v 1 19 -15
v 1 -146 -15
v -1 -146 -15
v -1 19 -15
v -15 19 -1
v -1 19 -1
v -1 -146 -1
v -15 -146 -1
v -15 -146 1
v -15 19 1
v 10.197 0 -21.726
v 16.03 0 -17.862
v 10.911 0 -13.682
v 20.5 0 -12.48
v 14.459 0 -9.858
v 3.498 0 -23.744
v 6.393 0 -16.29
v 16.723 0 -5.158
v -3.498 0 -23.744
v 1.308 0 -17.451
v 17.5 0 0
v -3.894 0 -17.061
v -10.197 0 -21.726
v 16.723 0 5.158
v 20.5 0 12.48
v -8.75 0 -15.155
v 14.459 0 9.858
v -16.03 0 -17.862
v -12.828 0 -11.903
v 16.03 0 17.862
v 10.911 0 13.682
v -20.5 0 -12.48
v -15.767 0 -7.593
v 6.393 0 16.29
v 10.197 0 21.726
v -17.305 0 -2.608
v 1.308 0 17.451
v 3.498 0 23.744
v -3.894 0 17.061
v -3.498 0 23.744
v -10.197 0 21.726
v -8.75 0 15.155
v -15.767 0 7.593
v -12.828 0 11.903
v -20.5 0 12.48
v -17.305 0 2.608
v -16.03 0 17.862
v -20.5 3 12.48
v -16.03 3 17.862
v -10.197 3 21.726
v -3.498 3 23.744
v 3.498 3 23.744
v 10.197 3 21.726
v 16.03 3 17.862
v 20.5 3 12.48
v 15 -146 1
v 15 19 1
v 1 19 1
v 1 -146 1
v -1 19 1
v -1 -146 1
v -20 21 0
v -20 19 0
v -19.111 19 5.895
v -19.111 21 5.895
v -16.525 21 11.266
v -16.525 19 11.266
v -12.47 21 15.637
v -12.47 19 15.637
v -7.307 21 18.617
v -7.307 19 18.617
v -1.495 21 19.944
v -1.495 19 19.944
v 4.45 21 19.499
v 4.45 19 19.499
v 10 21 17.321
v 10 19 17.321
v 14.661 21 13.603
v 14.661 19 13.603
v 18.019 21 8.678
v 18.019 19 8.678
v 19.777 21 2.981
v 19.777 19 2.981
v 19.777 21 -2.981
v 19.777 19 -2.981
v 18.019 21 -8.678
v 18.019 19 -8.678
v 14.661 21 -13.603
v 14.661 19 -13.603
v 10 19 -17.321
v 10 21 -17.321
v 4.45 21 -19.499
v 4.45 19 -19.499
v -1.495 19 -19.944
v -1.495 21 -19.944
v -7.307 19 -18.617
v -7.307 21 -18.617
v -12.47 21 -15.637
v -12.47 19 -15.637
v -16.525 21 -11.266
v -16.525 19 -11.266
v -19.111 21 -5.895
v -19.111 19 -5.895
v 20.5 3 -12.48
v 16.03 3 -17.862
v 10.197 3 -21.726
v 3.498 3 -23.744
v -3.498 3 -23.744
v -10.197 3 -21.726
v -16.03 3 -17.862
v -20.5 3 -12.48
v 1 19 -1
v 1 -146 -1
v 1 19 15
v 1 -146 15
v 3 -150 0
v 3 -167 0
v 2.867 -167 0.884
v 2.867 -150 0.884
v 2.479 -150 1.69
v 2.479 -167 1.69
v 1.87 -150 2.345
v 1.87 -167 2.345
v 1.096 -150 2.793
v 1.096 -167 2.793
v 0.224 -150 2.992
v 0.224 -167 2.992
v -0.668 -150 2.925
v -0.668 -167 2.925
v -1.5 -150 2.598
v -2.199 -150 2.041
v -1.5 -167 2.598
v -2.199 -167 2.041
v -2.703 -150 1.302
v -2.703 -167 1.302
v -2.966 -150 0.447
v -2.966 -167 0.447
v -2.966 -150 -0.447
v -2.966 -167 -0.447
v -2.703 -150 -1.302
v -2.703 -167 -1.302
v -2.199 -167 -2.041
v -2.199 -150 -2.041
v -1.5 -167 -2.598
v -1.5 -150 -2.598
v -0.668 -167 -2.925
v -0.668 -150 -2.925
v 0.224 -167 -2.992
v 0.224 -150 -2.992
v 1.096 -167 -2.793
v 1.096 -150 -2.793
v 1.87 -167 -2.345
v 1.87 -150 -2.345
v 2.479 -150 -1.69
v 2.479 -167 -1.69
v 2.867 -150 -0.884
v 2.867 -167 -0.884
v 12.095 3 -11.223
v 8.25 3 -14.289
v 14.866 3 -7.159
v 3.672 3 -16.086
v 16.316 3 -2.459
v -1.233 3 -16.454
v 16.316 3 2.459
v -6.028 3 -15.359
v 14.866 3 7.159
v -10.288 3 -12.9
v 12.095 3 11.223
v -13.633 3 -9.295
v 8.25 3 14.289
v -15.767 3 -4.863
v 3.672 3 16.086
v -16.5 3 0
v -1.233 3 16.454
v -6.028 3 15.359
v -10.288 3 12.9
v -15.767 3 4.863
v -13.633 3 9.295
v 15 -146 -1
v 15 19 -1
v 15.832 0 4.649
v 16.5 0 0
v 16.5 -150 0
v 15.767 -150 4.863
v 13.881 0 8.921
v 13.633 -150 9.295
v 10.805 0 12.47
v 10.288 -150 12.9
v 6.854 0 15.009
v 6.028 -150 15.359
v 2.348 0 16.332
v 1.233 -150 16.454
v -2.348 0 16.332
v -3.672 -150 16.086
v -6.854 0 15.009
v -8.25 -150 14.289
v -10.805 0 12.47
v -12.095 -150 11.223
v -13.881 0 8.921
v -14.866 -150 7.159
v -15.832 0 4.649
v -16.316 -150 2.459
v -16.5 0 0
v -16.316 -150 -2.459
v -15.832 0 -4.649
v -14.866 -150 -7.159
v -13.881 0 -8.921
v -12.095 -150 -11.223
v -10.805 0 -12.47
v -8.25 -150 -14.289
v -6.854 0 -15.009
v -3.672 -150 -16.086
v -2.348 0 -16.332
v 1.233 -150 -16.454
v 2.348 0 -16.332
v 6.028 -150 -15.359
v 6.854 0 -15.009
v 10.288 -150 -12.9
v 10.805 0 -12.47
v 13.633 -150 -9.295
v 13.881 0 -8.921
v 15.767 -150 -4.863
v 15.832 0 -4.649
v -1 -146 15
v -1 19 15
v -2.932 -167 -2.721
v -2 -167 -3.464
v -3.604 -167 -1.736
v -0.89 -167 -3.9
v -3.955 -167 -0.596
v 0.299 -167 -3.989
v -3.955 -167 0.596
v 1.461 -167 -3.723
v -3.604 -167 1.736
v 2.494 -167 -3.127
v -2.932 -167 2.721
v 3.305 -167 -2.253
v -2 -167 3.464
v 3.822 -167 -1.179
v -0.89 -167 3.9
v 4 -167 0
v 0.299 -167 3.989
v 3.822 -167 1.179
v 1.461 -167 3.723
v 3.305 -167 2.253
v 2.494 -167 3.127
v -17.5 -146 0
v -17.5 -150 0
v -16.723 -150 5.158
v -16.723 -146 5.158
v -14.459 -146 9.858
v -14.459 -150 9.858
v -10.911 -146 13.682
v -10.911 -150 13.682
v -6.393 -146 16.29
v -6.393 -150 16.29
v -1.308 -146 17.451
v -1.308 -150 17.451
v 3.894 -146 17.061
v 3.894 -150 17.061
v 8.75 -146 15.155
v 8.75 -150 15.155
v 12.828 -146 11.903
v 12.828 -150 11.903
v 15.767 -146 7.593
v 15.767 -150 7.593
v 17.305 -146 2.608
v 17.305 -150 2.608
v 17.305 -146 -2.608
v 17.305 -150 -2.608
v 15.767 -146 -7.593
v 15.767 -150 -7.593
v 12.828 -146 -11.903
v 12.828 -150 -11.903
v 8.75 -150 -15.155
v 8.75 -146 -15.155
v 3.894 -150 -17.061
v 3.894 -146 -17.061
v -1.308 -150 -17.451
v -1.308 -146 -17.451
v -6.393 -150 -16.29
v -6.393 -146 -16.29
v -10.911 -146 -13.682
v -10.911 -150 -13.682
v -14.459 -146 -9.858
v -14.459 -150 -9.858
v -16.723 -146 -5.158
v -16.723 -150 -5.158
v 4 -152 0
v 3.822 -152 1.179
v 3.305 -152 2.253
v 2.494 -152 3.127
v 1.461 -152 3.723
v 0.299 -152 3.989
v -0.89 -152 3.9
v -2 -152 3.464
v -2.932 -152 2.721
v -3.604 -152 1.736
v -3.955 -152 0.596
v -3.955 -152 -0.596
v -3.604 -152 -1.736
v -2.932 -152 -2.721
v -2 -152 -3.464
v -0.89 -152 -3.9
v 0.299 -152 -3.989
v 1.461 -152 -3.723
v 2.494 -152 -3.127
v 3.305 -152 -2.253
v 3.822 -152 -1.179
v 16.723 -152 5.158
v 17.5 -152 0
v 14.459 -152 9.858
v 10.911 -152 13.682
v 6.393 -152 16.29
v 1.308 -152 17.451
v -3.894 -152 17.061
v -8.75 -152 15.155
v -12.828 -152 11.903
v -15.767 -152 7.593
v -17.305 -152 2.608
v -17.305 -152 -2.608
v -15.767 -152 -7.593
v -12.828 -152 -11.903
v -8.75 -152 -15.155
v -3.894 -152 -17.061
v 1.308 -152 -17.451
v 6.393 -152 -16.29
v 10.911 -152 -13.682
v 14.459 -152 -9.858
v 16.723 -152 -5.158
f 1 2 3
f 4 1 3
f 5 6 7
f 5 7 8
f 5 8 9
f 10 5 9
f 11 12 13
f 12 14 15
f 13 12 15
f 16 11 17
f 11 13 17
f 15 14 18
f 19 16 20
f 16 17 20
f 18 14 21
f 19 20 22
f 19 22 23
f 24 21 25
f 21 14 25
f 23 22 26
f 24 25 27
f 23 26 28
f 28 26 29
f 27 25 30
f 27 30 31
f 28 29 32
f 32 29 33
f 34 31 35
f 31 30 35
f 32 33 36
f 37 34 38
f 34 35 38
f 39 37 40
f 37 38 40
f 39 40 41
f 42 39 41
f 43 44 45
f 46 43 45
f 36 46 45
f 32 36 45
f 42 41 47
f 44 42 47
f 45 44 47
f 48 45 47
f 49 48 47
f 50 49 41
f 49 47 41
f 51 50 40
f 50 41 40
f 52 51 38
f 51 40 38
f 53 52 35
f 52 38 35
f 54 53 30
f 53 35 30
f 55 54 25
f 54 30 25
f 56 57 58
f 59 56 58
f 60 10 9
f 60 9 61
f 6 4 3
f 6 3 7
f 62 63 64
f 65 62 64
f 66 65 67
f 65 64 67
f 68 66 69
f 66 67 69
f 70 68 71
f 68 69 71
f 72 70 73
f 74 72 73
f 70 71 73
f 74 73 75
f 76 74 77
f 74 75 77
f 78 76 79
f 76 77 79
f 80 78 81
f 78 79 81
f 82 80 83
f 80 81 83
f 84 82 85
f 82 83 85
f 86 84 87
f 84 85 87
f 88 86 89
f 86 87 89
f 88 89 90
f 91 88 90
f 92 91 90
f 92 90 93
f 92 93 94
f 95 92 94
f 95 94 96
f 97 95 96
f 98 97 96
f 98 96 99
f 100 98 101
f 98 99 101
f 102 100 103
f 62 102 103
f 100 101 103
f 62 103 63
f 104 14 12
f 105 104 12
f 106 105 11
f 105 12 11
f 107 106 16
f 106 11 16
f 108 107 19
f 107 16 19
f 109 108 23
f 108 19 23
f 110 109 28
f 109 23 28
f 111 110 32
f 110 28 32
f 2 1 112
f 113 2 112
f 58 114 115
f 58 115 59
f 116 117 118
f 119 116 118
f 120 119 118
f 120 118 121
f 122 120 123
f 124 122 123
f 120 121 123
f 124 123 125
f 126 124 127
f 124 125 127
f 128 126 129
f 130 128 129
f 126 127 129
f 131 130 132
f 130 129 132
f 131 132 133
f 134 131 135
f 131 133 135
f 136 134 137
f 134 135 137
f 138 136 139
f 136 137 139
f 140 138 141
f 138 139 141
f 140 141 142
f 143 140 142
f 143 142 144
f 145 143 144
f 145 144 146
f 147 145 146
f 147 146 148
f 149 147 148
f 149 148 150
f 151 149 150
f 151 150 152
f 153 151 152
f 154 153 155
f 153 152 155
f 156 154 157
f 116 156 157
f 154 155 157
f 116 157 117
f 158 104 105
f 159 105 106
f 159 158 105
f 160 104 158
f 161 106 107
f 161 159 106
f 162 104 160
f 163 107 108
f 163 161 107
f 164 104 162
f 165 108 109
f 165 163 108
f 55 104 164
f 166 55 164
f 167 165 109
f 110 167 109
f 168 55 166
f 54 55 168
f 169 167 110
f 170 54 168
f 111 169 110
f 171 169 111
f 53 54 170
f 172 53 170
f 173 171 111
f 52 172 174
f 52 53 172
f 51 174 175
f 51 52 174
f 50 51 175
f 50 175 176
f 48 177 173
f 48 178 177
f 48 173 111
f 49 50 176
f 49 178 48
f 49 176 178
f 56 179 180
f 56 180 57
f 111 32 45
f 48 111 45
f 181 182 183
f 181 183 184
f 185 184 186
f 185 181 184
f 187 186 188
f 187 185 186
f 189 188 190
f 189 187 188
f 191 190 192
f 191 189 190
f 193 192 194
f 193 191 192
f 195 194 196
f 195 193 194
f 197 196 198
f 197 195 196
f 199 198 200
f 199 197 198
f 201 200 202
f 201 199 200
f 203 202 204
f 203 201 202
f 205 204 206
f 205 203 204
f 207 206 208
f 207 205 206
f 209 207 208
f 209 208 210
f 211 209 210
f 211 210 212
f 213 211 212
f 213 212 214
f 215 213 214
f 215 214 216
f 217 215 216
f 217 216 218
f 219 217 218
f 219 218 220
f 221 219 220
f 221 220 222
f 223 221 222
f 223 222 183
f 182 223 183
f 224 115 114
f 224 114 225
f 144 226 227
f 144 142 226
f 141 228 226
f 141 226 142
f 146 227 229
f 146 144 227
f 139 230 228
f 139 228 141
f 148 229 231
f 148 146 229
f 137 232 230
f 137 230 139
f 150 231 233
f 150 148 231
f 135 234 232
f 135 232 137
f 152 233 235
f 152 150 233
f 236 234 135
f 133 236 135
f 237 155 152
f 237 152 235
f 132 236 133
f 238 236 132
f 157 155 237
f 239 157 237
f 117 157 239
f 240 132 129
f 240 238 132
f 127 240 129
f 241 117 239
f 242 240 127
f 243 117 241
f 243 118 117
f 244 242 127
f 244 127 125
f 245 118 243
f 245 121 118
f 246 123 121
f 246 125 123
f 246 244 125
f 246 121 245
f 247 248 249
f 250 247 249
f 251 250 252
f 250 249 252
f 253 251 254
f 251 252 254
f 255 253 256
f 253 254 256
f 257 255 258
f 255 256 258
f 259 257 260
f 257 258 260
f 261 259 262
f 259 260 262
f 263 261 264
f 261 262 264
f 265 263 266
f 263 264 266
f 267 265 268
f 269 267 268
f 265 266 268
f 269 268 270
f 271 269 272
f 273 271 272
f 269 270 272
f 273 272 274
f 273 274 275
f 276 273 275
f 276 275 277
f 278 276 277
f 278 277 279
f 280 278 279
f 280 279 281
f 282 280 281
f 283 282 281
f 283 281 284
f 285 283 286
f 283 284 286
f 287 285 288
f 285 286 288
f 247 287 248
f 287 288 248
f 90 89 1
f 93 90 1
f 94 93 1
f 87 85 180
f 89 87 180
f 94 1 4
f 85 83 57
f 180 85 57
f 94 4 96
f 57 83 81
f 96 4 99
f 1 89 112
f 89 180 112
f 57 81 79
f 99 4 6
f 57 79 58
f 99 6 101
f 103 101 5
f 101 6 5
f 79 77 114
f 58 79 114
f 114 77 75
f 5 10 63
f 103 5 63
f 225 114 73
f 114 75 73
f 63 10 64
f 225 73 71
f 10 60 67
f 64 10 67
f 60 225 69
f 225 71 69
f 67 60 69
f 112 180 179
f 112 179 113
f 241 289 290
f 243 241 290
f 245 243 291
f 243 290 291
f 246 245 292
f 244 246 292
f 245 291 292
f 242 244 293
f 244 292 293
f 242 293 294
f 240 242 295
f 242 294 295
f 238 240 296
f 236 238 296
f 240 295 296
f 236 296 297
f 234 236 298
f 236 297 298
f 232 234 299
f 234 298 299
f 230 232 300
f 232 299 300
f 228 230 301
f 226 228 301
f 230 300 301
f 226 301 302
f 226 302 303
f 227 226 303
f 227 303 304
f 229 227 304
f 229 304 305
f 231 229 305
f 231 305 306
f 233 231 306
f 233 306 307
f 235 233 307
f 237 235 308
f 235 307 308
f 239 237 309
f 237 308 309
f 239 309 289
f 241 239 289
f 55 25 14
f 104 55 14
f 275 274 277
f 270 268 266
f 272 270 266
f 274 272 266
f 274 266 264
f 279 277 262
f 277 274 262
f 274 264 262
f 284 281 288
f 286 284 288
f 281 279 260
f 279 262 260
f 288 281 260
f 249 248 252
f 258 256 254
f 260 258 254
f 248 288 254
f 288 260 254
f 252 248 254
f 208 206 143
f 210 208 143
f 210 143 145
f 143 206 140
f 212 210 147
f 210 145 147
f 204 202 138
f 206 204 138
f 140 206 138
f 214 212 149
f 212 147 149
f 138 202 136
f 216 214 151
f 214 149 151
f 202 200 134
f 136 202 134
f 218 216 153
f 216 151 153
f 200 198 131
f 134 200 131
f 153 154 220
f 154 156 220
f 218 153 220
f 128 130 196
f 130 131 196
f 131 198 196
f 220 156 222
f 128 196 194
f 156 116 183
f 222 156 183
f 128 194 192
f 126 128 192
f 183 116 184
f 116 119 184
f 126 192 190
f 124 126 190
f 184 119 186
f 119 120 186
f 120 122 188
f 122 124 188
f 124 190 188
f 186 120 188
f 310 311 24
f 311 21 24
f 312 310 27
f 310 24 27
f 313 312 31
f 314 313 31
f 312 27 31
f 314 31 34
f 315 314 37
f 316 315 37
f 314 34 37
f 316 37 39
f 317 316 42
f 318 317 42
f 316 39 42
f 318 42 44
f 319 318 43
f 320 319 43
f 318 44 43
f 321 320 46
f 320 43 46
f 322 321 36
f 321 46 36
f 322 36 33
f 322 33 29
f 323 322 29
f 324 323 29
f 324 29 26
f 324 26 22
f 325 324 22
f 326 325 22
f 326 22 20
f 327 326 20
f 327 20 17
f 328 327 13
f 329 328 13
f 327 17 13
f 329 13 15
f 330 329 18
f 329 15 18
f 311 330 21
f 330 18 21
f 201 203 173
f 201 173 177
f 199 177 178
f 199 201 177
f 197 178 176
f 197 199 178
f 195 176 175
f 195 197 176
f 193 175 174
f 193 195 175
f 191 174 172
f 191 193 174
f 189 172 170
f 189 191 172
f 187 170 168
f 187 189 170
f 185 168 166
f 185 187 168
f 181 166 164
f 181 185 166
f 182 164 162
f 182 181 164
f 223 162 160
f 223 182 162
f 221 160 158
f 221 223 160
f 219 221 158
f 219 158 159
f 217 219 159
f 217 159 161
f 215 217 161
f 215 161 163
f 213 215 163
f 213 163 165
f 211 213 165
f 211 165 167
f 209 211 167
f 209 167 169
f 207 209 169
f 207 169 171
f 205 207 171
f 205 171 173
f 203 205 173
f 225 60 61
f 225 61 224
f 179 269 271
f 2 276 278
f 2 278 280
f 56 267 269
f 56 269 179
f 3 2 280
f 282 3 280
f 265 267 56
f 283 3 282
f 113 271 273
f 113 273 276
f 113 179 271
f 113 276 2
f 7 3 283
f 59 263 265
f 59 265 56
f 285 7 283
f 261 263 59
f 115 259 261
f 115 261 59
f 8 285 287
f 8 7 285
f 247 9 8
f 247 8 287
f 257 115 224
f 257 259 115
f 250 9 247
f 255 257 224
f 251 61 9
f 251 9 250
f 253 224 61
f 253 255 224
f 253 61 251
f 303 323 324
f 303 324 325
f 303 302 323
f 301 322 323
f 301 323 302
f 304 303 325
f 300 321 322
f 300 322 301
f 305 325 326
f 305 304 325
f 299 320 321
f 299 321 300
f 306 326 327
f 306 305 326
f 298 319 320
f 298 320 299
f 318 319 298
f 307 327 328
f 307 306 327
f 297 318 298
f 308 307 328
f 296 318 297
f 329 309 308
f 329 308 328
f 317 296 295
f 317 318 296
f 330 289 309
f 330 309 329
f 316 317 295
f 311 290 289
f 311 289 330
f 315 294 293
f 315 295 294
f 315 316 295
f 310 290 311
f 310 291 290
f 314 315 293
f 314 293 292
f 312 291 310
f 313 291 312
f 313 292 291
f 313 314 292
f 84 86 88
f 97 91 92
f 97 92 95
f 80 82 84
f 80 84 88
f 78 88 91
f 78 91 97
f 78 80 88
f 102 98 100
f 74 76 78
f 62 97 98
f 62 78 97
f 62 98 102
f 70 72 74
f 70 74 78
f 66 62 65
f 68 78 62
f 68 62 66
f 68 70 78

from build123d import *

# Parameters (mm, degrees)
F0_R      = 17.5
F0_R_2    = 16.5
F1_DEPTH  = 150
F2_R      = 17.5
F3_DEPTH  = 2
F4_R      = 4
F5_DEPTH  = 15
F6_R      = 3
F7_DEPTH  = 17
F8_R      = 17.5
F8_R_2    = 16.5
F9_DEPTH  = 3
F10_R     = 17.5
F11_DEPTH = 4
F12_W     = 14
F12_H     = 2
F12_W_2   = 2
F12_H_2   = 14
F13_DEPTH = 165
F14_R     = 20
F15_DEPTH = 2


with BuildPart() as f1:
    # F0 (on Front) → F1 (new body)
    with BuildSketch(Plane.XZ):
        Circle(F0_R)
        Circle(F0_R_2, mode=Mode.SUBTRACT)
    extrude(amount=F1_DEPTH)

    # F2 (on face) → F3 (join)
    with BuildSketch(Plane.XZ.offset(150)):
        Circle(F2_R)
    extrude(amount=F3_DEPTH)

    # F4 (on face) → F5 (join)
    with BuildSketch(Plane.XZ.offset(152)):
        Circle(F4_R)
    extrude(amount=F5_DEPTH)

    # F6 (on face) → F7 (cut, through all)
    with BuildSketch(Plane.XZ.offset(167)):
        Circle(F6_R)
    extrude(amount=-F7_DEPTH, mode=Mode.SUBTRACT)

    # F8 (on face) → F9 (join)
    with BuildSketch(Plane(origin=(0, 0, 0), x_dir=(-1, 0, 0), z_dir=(0, 1, 0))):
        with BuildLine():
            Line((20.5, -12.4799839743), (20.5, 12.4799839743))
            ThreePointArc((20.5, 12.4799839743), (0, 24), (-20.5, 12.4799839743))
            Line((-20.5, 12.4799839743), (-20.5, -12.4799839743))
            ThreePointArc((-20.5, -12.4799839743), (0, -24), (20.5, -12.4799839743))
        make_face()
        Circle(F8_R, mode=Mode.SUBTRACT)
        Circle(F8_R)
        Circle(F8_R_2, mode=Mode.SUBTRACT)
    extrude(amount=F9_DEPTH)


with BuildPart() as f11:
    # F10 (on face) → F11 (new body)
    with BuildSketch(Plane(origin=(0, -150, 0), x_dir=(-1, 0, 0), z_dir=(0, 1, 0))):
        Circle(F10_R)
    extrude(amount=F11_DEPTH)

    # F12 (on face) → F13 (join)
    with BuildSketch(Plane(origin=(0, -146, 0), x_dir=(-1, 0, 0), z_dir=(0, 1, 0))):
        with Locations((8, 0)):
            Rectangle(F12_W, F12_H)
        Rectangle(F12_W_2, F12_H)
        with Locations((0, 8)):
            Rectangle(F12_W_2, F12_H_2)
        with Locations((-8, 0)):
            Rectangle(F12_W, F12_H)
        with Locations((0, -8)):
            Rectangle(F12_W_2, F12_H_2)
    extrude(amount=F13_DEPTH)

    # F14 (on face) → F15 (join)
    with BuildSketch(Plane(origin=(0, 19, 0), x_dir=(-1, 0, 0), z_dir=(0, 1, 0))):
        Circle(F14_R)
    extrude(amount=F15_DEPTH)


solid = Compound([f1.part, f11.part])
